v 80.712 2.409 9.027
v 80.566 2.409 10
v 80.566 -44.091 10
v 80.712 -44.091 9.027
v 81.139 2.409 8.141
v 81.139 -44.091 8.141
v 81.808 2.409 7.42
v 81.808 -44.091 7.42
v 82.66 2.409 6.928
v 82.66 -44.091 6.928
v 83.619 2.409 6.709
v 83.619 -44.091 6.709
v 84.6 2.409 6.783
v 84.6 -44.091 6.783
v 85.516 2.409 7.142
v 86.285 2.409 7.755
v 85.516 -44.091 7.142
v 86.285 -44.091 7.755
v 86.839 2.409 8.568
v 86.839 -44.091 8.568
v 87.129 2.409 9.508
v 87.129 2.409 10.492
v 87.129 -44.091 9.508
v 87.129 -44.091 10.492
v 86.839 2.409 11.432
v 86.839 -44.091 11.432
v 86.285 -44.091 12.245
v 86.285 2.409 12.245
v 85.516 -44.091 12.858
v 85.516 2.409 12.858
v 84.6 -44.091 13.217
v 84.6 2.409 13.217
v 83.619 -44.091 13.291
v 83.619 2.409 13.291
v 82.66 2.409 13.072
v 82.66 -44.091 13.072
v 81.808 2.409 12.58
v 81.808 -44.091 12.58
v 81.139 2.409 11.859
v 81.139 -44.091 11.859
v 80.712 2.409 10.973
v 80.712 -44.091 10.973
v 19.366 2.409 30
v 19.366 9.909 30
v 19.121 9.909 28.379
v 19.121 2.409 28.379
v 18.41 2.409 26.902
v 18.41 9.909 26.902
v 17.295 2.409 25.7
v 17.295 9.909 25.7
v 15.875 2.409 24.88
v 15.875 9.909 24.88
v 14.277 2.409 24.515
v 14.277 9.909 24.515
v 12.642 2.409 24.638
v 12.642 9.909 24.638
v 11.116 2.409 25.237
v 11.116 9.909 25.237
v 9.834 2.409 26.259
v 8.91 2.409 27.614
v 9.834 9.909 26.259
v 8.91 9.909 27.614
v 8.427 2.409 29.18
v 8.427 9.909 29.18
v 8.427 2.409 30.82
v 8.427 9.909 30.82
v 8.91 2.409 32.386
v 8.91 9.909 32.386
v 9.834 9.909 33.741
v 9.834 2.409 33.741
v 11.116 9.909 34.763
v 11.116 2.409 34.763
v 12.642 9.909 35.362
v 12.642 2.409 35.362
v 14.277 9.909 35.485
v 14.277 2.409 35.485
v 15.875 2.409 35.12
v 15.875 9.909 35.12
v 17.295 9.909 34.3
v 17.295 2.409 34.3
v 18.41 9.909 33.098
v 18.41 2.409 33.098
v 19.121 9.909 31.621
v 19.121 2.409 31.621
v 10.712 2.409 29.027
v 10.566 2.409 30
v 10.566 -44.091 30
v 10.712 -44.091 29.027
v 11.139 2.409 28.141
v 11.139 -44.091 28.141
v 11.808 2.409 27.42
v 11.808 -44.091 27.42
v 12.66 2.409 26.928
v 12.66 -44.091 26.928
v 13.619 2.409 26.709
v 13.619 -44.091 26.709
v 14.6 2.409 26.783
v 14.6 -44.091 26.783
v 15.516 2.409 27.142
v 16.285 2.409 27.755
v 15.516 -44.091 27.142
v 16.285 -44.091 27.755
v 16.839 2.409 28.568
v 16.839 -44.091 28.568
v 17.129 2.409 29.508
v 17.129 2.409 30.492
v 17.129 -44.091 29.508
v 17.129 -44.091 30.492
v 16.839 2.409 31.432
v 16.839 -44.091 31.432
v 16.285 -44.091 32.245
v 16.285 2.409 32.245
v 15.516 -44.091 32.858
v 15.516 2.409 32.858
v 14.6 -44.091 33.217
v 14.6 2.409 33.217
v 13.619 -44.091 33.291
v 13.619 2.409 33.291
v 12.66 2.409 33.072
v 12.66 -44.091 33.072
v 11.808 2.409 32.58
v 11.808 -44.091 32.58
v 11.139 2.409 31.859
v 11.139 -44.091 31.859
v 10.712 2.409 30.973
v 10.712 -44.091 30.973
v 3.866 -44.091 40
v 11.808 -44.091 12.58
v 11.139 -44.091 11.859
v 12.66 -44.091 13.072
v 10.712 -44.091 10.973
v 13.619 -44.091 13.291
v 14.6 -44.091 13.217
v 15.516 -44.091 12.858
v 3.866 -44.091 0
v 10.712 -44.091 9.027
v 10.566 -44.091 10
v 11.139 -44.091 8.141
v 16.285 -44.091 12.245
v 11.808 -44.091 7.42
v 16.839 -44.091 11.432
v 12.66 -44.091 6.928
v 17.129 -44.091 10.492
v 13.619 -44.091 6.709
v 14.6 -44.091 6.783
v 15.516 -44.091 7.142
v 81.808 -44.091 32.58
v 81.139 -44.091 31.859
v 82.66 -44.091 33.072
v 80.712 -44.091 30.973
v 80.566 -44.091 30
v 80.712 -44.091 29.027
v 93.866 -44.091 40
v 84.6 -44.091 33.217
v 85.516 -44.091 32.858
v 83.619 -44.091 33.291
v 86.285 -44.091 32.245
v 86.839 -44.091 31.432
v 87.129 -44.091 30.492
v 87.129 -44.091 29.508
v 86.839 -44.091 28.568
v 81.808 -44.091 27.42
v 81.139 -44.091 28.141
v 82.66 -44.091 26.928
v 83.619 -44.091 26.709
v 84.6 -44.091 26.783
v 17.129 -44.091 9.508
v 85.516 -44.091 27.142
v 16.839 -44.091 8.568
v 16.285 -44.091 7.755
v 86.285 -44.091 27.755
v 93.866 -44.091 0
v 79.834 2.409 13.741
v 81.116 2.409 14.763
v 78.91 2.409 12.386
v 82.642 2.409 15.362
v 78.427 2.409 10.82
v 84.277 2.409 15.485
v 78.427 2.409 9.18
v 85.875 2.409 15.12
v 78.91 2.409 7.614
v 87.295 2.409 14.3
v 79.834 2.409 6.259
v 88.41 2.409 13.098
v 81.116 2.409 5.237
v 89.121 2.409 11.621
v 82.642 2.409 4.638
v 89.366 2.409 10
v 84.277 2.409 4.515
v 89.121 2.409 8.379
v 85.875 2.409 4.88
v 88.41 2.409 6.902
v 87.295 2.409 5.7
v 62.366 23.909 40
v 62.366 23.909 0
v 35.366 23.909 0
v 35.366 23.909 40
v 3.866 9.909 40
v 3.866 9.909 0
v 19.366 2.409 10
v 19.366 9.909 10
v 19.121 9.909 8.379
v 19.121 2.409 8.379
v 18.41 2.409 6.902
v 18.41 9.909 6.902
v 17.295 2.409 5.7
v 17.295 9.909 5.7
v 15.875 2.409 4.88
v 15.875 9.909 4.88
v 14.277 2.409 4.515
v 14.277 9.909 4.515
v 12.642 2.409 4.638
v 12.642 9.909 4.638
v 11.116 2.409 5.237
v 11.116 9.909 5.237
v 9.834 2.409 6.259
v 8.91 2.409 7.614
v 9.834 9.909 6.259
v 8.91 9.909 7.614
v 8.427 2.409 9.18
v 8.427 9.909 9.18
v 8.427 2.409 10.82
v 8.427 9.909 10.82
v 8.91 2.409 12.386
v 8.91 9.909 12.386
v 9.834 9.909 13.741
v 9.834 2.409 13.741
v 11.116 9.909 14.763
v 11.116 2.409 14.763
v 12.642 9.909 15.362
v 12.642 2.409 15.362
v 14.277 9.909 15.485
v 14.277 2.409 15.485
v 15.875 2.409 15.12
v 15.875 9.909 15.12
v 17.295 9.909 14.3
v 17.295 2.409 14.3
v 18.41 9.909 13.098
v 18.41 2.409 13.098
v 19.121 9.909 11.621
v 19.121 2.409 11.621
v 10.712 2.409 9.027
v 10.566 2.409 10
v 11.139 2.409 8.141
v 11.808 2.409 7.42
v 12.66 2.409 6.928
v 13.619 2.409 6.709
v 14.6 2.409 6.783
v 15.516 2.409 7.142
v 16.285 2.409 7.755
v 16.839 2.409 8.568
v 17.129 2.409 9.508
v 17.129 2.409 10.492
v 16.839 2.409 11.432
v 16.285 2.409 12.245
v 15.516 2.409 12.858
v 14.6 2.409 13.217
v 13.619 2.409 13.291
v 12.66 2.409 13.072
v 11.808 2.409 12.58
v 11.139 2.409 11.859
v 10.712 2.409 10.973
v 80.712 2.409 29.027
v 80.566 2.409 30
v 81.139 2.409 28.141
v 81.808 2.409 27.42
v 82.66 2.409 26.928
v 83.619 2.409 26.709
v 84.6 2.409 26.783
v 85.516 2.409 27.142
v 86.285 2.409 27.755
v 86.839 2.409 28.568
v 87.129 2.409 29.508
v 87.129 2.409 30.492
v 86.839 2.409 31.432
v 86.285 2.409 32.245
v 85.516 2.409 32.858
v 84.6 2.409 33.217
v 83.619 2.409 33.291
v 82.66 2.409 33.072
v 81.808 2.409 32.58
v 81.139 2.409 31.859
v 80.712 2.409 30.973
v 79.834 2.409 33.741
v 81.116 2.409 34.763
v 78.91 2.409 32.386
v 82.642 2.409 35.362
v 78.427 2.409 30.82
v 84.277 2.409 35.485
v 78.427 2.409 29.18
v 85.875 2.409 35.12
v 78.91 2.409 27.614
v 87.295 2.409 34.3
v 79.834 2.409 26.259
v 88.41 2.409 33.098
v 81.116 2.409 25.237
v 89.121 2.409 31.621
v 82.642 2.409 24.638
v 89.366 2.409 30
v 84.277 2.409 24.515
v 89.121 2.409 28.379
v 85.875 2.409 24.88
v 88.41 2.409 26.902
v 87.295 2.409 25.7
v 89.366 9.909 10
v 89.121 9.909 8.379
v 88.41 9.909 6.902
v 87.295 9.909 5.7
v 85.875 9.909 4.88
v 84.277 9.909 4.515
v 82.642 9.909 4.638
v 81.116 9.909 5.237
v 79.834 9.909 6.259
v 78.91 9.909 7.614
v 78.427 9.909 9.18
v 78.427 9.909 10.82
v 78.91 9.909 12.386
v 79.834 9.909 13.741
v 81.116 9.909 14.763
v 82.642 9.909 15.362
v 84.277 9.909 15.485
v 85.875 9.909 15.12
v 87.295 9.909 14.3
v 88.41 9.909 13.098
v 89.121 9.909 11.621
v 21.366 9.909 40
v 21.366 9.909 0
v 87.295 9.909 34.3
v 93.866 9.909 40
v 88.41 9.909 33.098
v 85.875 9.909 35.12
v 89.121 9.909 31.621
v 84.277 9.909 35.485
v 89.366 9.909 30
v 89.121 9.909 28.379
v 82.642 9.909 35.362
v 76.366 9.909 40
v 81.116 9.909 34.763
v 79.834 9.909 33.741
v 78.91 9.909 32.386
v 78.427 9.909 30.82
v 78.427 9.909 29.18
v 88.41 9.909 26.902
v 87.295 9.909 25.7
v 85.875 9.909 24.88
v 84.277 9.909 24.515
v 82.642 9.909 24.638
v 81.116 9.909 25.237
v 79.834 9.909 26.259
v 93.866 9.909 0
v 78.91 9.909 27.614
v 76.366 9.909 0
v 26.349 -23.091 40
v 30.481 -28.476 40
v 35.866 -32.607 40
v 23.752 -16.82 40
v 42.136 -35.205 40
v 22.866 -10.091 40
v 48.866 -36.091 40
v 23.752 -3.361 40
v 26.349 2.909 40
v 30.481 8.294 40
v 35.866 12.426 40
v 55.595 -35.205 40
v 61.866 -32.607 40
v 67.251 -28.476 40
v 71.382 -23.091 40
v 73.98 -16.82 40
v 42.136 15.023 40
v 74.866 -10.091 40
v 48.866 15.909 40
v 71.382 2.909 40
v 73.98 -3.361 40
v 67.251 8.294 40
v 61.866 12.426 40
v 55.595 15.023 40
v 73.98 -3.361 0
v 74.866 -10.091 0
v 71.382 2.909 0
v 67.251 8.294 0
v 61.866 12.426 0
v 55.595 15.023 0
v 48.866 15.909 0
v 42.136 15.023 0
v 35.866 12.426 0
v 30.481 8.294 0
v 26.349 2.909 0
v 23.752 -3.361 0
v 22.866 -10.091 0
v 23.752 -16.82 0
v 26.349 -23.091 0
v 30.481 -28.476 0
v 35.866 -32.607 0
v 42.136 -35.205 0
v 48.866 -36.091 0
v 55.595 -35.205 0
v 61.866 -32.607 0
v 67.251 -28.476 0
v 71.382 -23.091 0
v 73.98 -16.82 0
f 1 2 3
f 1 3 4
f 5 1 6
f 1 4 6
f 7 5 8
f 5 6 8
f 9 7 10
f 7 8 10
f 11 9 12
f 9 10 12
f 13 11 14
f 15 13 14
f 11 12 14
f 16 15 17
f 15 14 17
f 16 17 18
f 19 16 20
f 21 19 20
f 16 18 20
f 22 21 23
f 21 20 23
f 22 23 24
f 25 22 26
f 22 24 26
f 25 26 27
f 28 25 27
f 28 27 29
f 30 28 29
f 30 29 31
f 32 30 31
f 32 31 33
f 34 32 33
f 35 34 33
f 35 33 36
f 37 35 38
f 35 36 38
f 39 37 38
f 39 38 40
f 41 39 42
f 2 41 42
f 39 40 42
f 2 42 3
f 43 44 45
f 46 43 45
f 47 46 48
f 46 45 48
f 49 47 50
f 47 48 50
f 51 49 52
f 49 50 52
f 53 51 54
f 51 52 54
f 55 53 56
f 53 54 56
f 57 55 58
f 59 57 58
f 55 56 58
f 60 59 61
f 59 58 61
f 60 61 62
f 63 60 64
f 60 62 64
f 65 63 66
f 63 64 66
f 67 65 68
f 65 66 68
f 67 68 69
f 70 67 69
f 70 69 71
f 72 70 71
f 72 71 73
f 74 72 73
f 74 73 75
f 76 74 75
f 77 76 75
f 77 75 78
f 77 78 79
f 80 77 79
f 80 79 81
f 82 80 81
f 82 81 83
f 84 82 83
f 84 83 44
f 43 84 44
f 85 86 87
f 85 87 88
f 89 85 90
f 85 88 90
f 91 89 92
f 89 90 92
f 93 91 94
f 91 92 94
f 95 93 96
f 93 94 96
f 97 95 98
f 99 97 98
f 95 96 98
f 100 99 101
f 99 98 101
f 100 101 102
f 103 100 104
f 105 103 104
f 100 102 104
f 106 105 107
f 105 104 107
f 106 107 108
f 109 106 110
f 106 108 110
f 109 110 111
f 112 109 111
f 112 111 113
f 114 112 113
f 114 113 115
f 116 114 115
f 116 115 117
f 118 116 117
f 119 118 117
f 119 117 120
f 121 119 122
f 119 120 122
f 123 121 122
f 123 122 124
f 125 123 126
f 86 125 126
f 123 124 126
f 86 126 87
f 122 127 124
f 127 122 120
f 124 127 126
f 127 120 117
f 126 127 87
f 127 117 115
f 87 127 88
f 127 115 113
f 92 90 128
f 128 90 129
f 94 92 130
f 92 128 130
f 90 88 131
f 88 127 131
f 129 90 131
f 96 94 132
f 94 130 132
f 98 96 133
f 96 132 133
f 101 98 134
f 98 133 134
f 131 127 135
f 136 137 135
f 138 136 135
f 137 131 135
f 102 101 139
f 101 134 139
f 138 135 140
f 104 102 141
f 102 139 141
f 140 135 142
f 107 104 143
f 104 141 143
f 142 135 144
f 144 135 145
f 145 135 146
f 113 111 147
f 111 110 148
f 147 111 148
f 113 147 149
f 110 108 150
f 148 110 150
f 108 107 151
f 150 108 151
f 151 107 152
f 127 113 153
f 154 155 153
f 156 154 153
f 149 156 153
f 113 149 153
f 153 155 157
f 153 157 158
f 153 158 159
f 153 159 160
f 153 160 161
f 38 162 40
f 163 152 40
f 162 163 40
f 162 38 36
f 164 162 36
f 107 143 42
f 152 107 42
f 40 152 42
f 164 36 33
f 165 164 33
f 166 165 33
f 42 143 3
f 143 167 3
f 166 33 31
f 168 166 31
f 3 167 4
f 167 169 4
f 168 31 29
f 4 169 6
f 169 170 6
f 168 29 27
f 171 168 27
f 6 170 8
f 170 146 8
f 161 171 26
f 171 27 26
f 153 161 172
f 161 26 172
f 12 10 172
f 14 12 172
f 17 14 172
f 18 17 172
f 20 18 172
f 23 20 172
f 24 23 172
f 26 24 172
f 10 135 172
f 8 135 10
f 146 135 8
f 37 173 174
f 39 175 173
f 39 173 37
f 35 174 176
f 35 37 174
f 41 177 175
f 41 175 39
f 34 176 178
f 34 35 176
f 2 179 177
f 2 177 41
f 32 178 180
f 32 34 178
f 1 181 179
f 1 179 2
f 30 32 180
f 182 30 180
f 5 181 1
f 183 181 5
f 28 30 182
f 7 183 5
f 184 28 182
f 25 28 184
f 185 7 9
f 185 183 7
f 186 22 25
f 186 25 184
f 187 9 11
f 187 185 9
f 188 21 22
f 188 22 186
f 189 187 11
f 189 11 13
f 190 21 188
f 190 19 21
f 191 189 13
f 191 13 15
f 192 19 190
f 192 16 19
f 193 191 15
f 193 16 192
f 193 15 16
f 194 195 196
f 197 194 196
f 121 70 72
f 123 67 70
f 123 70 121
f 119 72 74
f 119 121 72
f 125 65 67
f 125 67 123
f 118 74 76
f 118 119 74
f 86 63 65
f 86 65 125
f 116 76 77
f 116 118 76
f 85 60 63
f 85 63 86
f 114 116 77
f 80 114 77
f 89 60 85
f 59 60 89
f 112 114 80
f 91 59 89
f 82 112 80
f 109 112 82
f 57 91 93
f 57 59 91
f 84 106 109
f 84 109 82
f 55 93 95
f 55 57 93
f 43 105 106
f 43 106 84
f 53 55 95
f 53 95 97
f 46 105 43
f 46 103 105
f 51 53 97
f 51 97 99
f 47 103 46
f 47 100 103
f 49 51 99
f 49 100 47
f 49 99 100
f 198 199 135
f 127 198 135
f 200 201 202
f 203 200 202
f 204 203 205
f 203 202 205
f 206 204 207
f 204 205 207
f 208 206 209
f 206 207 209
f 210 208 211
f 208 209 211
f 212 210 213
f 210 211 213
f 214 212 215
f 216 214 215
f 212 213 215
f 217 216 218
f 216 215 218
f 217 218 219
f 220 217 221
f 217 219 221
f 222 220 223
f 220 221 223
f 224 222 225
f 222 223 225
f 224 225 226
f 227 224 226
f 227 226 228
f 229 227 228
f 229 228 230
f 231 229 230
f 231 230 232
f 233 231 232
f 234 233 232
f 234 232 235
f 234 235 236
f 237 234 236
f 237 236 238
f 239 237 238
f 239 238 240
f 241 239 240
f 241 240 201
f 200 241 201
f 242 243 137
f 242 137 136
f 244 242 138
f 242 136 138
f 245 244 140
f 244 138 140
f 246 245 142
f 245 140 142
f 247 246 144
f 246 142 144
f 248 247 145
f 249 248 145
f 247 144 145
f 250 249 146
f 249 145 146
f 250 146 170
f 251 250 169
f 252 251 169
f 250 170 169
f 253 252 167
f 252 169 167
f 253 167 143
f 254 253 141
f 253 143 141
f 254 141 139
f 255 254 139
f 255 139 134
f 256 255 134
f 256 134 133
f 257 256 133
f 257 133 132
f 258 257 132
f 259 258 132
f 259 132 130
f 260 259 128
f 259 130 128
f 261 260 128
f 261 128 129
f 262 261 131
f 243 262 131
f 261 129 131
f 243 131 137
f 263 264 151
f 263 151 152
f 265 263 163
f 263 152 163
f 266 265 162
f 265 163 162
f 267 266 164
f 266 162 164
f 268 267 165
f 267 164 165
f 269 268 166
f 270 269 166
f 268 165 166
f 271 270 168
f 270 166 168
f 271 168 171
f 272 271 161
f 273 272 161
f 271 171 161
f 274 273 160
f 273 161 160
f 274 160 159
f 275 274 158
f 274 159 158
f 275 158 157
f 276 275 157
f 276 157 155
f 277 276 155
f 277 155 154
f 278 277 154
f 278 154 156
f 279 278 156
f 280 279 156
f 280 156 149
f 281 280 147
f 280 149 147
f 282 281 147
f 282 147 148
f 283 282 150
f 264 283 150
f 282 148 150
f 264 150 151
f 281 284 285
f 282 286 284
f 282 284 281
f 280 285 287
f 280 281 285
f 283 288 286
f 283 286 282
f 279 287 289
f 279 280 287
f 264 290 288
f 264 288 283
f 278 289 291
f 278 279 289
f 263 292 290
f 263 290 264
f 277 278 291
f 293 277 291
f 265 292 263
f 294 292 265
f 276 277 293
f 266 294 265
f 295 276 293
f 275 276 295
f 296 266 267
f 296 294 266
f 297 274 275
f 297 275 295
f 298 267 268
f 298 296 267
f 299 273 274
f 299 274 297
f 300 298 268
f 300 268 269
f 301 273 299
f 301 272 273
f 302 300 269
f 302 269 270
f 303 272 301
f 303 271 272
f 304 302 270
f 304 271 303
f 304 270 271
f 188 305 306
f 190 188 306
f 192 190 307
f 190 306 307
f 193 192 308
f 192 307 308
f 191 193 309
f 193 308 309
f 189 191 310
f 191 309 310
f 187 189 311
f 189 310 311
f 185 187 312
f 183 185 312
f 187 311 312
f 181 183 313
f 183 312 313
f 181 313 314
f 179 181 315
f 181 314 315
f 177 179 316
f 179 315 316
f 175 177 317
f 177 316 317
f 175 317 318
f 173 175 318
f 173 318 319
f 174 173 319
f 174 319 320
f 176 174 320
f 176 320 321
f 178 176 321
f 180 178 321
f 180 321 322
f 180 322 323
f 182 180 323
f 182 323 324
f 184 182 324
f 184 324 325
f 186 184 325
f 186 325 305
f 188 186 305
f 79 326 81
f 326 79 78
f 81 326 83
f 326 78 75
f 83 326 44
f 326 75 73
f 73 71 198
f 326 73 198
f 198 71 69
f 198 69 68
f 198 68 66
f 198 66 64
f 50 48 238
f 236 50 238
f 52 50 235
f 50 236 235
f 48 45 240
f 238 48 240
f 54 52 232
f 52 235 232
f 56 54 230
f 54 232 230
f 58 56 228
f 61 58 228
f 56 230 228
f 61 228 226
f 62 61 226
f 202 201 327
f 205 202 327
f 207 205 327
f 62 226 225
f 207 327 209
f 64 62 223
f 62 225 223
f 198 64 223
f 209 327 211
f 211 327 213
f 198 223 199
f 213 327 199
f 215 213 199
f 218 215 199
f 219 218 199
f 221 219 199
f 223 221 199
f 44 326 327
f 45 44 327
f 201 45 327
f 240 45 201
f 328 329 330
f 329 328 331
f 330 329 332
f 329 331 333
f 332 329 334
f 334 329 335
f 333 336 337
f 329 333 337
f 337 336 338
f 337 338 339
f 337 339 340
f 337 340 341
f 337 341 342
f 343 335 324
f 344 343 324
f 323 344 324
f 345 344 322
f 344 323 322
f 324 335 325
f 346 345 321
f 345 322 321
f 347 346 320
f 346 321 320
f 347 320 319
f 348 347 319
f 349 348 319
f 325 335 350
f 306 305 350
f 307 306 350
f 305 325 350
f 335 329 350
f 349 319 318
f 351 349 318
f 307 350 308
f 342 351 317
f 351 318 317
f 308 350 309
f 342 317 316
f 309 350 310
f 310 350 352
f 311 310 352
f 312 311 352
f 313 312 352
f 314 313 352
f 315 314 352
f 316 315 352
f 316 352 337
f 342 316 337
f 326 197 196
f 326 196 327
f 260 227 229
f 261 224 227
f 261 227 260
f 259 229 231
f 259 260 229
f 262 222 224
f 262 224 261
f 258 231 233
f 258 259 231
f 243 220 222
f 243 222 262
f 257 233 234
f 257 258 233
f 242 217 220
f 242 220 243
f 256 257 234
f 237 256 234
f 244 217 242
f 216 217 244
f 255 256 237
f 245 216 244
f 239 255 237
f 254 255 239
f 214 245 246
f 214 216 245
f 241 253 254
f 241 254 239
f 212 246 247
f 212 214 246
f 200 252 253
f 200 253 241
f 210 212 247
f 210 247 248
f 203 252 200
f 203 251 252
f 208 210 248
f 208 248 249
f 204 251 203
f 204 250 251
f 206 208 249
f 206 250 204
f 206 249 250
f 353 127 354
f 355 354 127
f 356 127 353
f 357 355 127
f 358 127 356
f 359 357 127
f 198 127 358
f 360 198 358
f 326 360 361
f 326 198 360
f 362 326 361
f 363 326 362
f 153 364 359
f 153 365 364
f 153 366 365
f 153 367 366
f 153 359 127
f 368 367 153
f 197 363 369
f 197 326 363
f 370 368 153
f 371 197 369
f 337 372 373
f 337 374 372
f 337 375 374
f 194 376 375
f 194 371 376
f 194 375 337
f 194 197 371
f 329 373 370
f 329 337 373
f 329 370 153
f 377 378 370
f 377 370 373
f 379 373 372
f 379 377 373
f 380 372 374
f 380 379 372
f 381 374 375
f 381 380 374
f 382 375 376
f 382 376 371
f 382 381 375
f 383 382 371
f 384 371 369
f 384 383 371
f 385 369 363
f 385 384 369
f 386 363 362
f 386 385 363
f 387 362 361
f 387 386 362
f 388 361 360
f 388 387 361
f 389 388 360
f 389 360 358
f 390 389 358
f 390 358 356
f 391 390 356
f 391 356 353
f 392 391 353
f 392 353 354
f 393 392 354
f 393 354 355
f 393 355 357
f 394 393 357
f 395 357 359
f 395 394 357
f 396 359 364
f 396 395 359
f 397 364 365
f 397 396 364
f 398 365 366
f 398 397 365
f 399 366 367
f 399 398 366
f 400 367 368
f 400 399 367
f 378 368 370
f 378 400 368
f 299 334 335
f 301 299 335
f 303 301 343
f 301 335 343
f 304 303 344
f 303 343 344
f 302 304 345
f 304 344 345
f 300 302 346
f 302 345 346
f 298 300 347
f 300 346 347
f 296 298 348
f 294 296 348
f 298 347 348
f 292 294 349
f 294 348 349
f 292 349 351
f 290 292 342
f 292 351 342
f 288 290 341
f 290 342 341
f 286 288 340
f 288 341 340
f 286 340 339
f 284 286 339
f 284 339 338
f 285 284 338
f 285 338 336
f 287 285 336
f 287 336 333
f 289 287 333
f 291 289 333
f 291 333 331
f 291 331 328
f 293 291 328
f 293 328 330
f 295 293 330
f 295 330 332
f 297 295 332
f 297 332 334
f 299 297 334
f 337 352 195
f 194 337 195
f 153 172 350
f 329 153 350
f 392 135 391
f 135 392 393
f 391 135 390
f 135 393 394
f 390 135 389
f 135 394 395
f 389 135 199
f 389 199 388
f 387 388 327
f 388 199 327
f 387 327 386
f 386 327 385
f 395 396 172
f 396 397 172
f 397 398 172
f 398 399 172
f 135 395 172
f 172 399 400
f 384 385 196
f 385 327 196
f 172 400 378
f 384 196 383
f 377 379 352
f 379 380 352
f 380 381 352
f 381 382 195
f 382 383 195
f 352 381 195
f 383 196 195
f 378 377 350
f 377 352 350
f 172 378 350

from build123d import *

# Parameters (mm, degrees)
SKETCH1_R         = 26
EXTRUSION1_DEPTH  = 40
HOLE1_D           = 6.6
HOLE1_CBORE_D     = 11
HOLE1_CBORE_DEPTH = 7.499997


with BuildPart() as part:
    # Sketch1 → Extrusion1 (new body)
    with BuildSketch(Plane.XY):
        Polygon((21.365726522, 9.909240265), (3.865726522, 9.909240265), (3.865726522, -44.090759735), (93.865726522, -44.090759735), (93.865726522, 9.909240265), (76.365726522, 9.909240265), (62.365726522, 23.909240265), (35.365726522, 23.909240265), align=None)
        with Locations((48.865726522, -10.090759735)):
            Circle(SKETCH1_R, mode=Mode.SUBTRACT)
    extrude(amount=EXTRUSION1_DEPTH)

    # Hole1 (through all)
    with Locations(Plane(origin=(0, 9.909240265, 0), x_dir=(1, 0, 0), z_dir=(0, 1, 0))):
        with Locations((13.865726522, -10), (13.865726522, -30), (83.865726522, -10), (83.865726522, -30)):
            CounterBoreHole(HOLE1_D / 2, HOLE1_CBORE_D / 2, HOLE1_CBORE_DEPTH)


solid = part.part
